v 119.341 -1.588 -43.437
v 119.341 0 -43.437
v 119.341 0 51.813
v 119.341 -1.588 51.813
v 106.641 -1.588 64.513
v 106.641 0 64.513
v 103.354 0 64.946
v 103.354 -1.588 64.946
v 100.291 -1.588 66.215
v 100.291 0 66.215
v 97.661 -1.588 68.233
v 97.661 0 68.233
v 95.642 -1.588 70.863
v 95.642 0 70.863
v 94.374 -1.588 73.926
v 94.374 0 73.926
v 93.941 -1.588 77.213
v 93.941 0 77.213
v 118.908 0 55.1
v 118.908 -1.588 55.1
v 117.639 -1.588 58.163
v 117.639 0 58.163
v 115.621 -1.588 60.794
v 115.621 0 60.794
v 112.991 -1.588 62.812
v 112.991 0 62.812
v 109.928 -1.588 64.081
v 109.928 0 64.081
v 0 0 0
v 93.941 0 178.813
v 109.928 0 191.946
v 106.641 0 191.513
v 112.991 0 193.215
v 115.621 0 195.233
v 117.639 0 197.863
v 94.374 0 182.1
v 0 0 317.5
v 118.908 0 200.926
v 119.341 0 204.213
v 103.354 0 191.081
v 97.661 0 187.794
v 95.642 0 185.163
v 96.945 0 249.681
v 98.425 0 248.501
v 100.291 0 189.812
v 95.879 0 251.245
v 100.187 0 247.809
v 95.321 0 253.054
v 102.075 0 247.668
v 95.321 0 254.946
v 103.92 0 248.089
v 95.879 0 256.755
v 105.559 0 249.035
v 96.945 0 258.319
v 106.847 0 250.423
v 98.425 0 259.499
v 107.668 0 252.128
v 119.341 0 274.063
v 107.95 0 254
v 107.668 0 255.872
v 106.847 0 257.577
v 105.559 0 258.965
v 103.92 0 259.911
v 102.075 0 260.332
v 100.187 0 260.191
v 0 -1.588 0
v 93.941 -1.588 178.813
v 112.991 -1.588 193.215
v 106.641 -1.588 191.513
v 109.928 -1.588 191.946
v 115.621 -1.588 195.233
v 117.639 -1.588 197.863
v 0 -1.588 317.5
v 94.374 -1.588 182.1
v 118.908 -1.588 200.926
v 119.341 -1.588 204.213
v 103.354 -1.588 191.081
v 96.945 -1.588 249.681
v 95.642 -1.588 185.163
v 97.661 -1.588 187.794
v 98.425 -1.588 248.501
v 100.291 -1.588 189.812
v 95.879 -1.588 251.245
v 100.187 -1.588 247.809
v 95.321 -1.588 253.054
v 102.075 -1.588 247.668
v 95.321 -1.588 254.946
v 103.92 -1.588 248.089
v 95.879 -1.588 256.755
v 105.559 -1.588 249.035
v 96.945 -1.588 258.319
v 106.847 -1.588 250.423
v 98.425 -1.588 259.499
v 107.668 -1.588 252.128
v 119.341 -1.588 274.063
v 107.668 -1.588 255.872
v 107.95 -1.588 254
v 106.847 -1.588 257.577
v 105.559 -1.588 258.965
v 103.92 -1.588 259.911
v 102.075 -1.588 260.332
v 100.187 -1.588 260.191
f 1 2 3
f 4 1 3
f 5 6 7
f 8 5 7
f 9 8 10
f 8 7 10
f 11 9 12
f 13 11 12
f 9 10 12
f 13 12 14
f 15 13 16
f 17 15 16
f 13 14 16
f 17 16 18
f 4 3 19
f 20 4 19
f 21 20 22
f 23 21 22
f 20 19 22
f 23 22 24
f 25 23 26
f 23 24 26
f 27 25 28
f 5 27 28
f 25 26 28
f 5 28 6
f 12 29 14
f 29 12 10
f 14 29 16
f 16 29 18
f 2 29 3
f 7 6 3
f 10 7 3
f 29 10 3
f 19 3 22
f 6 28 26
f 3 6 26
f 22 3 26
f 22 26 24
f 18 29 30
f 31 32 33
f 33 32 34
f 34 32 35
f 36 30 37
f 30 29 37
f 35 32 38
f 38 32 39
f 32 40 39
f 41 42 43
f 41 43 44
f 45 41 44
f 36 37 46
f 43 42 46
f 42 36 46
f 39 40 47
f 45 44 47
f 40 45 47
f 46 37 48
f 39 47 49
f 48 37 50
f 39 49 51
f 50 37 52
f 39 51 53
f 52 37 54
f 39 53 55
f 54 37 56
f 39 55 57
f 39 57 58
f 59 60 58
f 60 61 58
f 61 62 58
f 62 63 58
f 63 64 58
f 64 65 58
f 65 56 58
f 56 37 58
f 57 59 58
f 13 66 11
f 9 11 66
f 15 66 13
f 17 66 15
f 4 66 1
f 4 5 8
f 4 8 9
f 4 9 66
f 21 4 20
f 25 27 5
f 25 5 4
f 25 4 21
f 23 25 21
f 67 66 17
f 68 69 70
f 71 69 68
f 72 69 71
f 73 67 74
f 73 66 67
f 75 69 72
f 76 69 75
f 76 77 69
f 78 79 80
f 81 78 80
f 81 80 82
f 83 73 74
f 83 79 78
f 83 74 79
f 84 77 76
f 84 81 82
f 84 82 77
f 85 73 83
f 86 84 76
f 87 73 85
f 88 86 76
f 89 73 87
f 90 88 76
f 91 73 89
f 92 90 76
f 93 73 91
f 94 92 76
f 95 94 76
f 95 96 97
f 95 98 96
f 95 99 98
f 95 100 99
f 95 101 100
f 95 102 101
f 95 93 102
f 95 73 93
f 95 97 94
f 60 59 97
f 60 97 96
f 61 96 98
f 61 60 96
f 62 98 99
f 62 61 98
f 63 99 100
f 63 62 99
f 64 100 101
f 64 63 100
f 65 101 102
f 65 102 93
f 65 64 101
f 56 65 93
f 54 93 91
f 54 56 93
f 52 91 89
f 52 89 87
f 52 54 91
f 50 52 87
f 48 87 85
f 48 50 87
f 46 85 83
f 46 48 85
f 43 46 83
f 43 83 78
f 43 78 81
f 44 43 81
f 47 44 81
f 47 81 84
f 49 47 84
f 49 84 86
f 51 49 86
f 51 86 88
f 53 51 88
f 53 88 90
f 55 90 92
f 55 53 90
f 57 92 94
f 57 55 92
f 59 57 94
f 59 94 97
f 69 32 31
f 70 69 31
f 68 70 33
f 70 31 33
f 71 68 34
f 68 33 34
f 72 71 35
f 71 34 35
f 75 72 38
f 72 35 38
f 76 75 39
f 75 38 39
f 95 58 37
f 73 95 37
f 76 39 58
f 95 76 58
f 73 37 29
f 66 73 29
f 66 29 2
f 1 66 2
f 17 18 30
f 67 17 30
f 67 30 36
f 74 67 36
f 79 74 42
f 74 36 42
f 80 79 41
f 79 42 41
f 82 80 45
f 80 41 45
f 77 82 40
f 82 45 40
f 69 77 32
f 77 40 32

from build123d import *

# Parameters (mm, degrees)
F0_R     = 6.35
F1_DEPTH = 1.5875


with BuildPart() as f1:
    # F0 (on Front) → F1 (new body)
    with BuildSketch(Plane.XZ):
        with BuildLine():
            Line((0, 317.5), (0, 0))
            Line((0, 0), (119.340963, -43.436558))
            Line((119.340963, -43.436558), (119.340963, 51.813442))
            ThreePointArc((119.340963, 51.813442), (115.621219, 60.793698), (106.640963, 64.513442))
            ThreePointArc((106.640963, 64.513442), (97.660707, 68.233186), (93.940963, 77.213442))
            Line((93.940963, 77.213442), (93.940963, 178.813442))
            ThreePointArc((93.940963, 178.813442), (97.660707, 187.793698), (106.640963, 191.513442))
            ThreePointArc((106.640963, 191.513442), (115.621219, 195.233186), (119.340963, 204.213442))
            Line((119.340963, 204.213442), (119.340963, 274.063442))
            Line((119.340963, 274.063442), (0, 317.5))
        make_face()
        with Locations((101.6, 254)):
            Circle(F0_R, mode=Mode.SUBTRACT)
    extrude(amount=F1_DEPTH)


solid = f1.part
